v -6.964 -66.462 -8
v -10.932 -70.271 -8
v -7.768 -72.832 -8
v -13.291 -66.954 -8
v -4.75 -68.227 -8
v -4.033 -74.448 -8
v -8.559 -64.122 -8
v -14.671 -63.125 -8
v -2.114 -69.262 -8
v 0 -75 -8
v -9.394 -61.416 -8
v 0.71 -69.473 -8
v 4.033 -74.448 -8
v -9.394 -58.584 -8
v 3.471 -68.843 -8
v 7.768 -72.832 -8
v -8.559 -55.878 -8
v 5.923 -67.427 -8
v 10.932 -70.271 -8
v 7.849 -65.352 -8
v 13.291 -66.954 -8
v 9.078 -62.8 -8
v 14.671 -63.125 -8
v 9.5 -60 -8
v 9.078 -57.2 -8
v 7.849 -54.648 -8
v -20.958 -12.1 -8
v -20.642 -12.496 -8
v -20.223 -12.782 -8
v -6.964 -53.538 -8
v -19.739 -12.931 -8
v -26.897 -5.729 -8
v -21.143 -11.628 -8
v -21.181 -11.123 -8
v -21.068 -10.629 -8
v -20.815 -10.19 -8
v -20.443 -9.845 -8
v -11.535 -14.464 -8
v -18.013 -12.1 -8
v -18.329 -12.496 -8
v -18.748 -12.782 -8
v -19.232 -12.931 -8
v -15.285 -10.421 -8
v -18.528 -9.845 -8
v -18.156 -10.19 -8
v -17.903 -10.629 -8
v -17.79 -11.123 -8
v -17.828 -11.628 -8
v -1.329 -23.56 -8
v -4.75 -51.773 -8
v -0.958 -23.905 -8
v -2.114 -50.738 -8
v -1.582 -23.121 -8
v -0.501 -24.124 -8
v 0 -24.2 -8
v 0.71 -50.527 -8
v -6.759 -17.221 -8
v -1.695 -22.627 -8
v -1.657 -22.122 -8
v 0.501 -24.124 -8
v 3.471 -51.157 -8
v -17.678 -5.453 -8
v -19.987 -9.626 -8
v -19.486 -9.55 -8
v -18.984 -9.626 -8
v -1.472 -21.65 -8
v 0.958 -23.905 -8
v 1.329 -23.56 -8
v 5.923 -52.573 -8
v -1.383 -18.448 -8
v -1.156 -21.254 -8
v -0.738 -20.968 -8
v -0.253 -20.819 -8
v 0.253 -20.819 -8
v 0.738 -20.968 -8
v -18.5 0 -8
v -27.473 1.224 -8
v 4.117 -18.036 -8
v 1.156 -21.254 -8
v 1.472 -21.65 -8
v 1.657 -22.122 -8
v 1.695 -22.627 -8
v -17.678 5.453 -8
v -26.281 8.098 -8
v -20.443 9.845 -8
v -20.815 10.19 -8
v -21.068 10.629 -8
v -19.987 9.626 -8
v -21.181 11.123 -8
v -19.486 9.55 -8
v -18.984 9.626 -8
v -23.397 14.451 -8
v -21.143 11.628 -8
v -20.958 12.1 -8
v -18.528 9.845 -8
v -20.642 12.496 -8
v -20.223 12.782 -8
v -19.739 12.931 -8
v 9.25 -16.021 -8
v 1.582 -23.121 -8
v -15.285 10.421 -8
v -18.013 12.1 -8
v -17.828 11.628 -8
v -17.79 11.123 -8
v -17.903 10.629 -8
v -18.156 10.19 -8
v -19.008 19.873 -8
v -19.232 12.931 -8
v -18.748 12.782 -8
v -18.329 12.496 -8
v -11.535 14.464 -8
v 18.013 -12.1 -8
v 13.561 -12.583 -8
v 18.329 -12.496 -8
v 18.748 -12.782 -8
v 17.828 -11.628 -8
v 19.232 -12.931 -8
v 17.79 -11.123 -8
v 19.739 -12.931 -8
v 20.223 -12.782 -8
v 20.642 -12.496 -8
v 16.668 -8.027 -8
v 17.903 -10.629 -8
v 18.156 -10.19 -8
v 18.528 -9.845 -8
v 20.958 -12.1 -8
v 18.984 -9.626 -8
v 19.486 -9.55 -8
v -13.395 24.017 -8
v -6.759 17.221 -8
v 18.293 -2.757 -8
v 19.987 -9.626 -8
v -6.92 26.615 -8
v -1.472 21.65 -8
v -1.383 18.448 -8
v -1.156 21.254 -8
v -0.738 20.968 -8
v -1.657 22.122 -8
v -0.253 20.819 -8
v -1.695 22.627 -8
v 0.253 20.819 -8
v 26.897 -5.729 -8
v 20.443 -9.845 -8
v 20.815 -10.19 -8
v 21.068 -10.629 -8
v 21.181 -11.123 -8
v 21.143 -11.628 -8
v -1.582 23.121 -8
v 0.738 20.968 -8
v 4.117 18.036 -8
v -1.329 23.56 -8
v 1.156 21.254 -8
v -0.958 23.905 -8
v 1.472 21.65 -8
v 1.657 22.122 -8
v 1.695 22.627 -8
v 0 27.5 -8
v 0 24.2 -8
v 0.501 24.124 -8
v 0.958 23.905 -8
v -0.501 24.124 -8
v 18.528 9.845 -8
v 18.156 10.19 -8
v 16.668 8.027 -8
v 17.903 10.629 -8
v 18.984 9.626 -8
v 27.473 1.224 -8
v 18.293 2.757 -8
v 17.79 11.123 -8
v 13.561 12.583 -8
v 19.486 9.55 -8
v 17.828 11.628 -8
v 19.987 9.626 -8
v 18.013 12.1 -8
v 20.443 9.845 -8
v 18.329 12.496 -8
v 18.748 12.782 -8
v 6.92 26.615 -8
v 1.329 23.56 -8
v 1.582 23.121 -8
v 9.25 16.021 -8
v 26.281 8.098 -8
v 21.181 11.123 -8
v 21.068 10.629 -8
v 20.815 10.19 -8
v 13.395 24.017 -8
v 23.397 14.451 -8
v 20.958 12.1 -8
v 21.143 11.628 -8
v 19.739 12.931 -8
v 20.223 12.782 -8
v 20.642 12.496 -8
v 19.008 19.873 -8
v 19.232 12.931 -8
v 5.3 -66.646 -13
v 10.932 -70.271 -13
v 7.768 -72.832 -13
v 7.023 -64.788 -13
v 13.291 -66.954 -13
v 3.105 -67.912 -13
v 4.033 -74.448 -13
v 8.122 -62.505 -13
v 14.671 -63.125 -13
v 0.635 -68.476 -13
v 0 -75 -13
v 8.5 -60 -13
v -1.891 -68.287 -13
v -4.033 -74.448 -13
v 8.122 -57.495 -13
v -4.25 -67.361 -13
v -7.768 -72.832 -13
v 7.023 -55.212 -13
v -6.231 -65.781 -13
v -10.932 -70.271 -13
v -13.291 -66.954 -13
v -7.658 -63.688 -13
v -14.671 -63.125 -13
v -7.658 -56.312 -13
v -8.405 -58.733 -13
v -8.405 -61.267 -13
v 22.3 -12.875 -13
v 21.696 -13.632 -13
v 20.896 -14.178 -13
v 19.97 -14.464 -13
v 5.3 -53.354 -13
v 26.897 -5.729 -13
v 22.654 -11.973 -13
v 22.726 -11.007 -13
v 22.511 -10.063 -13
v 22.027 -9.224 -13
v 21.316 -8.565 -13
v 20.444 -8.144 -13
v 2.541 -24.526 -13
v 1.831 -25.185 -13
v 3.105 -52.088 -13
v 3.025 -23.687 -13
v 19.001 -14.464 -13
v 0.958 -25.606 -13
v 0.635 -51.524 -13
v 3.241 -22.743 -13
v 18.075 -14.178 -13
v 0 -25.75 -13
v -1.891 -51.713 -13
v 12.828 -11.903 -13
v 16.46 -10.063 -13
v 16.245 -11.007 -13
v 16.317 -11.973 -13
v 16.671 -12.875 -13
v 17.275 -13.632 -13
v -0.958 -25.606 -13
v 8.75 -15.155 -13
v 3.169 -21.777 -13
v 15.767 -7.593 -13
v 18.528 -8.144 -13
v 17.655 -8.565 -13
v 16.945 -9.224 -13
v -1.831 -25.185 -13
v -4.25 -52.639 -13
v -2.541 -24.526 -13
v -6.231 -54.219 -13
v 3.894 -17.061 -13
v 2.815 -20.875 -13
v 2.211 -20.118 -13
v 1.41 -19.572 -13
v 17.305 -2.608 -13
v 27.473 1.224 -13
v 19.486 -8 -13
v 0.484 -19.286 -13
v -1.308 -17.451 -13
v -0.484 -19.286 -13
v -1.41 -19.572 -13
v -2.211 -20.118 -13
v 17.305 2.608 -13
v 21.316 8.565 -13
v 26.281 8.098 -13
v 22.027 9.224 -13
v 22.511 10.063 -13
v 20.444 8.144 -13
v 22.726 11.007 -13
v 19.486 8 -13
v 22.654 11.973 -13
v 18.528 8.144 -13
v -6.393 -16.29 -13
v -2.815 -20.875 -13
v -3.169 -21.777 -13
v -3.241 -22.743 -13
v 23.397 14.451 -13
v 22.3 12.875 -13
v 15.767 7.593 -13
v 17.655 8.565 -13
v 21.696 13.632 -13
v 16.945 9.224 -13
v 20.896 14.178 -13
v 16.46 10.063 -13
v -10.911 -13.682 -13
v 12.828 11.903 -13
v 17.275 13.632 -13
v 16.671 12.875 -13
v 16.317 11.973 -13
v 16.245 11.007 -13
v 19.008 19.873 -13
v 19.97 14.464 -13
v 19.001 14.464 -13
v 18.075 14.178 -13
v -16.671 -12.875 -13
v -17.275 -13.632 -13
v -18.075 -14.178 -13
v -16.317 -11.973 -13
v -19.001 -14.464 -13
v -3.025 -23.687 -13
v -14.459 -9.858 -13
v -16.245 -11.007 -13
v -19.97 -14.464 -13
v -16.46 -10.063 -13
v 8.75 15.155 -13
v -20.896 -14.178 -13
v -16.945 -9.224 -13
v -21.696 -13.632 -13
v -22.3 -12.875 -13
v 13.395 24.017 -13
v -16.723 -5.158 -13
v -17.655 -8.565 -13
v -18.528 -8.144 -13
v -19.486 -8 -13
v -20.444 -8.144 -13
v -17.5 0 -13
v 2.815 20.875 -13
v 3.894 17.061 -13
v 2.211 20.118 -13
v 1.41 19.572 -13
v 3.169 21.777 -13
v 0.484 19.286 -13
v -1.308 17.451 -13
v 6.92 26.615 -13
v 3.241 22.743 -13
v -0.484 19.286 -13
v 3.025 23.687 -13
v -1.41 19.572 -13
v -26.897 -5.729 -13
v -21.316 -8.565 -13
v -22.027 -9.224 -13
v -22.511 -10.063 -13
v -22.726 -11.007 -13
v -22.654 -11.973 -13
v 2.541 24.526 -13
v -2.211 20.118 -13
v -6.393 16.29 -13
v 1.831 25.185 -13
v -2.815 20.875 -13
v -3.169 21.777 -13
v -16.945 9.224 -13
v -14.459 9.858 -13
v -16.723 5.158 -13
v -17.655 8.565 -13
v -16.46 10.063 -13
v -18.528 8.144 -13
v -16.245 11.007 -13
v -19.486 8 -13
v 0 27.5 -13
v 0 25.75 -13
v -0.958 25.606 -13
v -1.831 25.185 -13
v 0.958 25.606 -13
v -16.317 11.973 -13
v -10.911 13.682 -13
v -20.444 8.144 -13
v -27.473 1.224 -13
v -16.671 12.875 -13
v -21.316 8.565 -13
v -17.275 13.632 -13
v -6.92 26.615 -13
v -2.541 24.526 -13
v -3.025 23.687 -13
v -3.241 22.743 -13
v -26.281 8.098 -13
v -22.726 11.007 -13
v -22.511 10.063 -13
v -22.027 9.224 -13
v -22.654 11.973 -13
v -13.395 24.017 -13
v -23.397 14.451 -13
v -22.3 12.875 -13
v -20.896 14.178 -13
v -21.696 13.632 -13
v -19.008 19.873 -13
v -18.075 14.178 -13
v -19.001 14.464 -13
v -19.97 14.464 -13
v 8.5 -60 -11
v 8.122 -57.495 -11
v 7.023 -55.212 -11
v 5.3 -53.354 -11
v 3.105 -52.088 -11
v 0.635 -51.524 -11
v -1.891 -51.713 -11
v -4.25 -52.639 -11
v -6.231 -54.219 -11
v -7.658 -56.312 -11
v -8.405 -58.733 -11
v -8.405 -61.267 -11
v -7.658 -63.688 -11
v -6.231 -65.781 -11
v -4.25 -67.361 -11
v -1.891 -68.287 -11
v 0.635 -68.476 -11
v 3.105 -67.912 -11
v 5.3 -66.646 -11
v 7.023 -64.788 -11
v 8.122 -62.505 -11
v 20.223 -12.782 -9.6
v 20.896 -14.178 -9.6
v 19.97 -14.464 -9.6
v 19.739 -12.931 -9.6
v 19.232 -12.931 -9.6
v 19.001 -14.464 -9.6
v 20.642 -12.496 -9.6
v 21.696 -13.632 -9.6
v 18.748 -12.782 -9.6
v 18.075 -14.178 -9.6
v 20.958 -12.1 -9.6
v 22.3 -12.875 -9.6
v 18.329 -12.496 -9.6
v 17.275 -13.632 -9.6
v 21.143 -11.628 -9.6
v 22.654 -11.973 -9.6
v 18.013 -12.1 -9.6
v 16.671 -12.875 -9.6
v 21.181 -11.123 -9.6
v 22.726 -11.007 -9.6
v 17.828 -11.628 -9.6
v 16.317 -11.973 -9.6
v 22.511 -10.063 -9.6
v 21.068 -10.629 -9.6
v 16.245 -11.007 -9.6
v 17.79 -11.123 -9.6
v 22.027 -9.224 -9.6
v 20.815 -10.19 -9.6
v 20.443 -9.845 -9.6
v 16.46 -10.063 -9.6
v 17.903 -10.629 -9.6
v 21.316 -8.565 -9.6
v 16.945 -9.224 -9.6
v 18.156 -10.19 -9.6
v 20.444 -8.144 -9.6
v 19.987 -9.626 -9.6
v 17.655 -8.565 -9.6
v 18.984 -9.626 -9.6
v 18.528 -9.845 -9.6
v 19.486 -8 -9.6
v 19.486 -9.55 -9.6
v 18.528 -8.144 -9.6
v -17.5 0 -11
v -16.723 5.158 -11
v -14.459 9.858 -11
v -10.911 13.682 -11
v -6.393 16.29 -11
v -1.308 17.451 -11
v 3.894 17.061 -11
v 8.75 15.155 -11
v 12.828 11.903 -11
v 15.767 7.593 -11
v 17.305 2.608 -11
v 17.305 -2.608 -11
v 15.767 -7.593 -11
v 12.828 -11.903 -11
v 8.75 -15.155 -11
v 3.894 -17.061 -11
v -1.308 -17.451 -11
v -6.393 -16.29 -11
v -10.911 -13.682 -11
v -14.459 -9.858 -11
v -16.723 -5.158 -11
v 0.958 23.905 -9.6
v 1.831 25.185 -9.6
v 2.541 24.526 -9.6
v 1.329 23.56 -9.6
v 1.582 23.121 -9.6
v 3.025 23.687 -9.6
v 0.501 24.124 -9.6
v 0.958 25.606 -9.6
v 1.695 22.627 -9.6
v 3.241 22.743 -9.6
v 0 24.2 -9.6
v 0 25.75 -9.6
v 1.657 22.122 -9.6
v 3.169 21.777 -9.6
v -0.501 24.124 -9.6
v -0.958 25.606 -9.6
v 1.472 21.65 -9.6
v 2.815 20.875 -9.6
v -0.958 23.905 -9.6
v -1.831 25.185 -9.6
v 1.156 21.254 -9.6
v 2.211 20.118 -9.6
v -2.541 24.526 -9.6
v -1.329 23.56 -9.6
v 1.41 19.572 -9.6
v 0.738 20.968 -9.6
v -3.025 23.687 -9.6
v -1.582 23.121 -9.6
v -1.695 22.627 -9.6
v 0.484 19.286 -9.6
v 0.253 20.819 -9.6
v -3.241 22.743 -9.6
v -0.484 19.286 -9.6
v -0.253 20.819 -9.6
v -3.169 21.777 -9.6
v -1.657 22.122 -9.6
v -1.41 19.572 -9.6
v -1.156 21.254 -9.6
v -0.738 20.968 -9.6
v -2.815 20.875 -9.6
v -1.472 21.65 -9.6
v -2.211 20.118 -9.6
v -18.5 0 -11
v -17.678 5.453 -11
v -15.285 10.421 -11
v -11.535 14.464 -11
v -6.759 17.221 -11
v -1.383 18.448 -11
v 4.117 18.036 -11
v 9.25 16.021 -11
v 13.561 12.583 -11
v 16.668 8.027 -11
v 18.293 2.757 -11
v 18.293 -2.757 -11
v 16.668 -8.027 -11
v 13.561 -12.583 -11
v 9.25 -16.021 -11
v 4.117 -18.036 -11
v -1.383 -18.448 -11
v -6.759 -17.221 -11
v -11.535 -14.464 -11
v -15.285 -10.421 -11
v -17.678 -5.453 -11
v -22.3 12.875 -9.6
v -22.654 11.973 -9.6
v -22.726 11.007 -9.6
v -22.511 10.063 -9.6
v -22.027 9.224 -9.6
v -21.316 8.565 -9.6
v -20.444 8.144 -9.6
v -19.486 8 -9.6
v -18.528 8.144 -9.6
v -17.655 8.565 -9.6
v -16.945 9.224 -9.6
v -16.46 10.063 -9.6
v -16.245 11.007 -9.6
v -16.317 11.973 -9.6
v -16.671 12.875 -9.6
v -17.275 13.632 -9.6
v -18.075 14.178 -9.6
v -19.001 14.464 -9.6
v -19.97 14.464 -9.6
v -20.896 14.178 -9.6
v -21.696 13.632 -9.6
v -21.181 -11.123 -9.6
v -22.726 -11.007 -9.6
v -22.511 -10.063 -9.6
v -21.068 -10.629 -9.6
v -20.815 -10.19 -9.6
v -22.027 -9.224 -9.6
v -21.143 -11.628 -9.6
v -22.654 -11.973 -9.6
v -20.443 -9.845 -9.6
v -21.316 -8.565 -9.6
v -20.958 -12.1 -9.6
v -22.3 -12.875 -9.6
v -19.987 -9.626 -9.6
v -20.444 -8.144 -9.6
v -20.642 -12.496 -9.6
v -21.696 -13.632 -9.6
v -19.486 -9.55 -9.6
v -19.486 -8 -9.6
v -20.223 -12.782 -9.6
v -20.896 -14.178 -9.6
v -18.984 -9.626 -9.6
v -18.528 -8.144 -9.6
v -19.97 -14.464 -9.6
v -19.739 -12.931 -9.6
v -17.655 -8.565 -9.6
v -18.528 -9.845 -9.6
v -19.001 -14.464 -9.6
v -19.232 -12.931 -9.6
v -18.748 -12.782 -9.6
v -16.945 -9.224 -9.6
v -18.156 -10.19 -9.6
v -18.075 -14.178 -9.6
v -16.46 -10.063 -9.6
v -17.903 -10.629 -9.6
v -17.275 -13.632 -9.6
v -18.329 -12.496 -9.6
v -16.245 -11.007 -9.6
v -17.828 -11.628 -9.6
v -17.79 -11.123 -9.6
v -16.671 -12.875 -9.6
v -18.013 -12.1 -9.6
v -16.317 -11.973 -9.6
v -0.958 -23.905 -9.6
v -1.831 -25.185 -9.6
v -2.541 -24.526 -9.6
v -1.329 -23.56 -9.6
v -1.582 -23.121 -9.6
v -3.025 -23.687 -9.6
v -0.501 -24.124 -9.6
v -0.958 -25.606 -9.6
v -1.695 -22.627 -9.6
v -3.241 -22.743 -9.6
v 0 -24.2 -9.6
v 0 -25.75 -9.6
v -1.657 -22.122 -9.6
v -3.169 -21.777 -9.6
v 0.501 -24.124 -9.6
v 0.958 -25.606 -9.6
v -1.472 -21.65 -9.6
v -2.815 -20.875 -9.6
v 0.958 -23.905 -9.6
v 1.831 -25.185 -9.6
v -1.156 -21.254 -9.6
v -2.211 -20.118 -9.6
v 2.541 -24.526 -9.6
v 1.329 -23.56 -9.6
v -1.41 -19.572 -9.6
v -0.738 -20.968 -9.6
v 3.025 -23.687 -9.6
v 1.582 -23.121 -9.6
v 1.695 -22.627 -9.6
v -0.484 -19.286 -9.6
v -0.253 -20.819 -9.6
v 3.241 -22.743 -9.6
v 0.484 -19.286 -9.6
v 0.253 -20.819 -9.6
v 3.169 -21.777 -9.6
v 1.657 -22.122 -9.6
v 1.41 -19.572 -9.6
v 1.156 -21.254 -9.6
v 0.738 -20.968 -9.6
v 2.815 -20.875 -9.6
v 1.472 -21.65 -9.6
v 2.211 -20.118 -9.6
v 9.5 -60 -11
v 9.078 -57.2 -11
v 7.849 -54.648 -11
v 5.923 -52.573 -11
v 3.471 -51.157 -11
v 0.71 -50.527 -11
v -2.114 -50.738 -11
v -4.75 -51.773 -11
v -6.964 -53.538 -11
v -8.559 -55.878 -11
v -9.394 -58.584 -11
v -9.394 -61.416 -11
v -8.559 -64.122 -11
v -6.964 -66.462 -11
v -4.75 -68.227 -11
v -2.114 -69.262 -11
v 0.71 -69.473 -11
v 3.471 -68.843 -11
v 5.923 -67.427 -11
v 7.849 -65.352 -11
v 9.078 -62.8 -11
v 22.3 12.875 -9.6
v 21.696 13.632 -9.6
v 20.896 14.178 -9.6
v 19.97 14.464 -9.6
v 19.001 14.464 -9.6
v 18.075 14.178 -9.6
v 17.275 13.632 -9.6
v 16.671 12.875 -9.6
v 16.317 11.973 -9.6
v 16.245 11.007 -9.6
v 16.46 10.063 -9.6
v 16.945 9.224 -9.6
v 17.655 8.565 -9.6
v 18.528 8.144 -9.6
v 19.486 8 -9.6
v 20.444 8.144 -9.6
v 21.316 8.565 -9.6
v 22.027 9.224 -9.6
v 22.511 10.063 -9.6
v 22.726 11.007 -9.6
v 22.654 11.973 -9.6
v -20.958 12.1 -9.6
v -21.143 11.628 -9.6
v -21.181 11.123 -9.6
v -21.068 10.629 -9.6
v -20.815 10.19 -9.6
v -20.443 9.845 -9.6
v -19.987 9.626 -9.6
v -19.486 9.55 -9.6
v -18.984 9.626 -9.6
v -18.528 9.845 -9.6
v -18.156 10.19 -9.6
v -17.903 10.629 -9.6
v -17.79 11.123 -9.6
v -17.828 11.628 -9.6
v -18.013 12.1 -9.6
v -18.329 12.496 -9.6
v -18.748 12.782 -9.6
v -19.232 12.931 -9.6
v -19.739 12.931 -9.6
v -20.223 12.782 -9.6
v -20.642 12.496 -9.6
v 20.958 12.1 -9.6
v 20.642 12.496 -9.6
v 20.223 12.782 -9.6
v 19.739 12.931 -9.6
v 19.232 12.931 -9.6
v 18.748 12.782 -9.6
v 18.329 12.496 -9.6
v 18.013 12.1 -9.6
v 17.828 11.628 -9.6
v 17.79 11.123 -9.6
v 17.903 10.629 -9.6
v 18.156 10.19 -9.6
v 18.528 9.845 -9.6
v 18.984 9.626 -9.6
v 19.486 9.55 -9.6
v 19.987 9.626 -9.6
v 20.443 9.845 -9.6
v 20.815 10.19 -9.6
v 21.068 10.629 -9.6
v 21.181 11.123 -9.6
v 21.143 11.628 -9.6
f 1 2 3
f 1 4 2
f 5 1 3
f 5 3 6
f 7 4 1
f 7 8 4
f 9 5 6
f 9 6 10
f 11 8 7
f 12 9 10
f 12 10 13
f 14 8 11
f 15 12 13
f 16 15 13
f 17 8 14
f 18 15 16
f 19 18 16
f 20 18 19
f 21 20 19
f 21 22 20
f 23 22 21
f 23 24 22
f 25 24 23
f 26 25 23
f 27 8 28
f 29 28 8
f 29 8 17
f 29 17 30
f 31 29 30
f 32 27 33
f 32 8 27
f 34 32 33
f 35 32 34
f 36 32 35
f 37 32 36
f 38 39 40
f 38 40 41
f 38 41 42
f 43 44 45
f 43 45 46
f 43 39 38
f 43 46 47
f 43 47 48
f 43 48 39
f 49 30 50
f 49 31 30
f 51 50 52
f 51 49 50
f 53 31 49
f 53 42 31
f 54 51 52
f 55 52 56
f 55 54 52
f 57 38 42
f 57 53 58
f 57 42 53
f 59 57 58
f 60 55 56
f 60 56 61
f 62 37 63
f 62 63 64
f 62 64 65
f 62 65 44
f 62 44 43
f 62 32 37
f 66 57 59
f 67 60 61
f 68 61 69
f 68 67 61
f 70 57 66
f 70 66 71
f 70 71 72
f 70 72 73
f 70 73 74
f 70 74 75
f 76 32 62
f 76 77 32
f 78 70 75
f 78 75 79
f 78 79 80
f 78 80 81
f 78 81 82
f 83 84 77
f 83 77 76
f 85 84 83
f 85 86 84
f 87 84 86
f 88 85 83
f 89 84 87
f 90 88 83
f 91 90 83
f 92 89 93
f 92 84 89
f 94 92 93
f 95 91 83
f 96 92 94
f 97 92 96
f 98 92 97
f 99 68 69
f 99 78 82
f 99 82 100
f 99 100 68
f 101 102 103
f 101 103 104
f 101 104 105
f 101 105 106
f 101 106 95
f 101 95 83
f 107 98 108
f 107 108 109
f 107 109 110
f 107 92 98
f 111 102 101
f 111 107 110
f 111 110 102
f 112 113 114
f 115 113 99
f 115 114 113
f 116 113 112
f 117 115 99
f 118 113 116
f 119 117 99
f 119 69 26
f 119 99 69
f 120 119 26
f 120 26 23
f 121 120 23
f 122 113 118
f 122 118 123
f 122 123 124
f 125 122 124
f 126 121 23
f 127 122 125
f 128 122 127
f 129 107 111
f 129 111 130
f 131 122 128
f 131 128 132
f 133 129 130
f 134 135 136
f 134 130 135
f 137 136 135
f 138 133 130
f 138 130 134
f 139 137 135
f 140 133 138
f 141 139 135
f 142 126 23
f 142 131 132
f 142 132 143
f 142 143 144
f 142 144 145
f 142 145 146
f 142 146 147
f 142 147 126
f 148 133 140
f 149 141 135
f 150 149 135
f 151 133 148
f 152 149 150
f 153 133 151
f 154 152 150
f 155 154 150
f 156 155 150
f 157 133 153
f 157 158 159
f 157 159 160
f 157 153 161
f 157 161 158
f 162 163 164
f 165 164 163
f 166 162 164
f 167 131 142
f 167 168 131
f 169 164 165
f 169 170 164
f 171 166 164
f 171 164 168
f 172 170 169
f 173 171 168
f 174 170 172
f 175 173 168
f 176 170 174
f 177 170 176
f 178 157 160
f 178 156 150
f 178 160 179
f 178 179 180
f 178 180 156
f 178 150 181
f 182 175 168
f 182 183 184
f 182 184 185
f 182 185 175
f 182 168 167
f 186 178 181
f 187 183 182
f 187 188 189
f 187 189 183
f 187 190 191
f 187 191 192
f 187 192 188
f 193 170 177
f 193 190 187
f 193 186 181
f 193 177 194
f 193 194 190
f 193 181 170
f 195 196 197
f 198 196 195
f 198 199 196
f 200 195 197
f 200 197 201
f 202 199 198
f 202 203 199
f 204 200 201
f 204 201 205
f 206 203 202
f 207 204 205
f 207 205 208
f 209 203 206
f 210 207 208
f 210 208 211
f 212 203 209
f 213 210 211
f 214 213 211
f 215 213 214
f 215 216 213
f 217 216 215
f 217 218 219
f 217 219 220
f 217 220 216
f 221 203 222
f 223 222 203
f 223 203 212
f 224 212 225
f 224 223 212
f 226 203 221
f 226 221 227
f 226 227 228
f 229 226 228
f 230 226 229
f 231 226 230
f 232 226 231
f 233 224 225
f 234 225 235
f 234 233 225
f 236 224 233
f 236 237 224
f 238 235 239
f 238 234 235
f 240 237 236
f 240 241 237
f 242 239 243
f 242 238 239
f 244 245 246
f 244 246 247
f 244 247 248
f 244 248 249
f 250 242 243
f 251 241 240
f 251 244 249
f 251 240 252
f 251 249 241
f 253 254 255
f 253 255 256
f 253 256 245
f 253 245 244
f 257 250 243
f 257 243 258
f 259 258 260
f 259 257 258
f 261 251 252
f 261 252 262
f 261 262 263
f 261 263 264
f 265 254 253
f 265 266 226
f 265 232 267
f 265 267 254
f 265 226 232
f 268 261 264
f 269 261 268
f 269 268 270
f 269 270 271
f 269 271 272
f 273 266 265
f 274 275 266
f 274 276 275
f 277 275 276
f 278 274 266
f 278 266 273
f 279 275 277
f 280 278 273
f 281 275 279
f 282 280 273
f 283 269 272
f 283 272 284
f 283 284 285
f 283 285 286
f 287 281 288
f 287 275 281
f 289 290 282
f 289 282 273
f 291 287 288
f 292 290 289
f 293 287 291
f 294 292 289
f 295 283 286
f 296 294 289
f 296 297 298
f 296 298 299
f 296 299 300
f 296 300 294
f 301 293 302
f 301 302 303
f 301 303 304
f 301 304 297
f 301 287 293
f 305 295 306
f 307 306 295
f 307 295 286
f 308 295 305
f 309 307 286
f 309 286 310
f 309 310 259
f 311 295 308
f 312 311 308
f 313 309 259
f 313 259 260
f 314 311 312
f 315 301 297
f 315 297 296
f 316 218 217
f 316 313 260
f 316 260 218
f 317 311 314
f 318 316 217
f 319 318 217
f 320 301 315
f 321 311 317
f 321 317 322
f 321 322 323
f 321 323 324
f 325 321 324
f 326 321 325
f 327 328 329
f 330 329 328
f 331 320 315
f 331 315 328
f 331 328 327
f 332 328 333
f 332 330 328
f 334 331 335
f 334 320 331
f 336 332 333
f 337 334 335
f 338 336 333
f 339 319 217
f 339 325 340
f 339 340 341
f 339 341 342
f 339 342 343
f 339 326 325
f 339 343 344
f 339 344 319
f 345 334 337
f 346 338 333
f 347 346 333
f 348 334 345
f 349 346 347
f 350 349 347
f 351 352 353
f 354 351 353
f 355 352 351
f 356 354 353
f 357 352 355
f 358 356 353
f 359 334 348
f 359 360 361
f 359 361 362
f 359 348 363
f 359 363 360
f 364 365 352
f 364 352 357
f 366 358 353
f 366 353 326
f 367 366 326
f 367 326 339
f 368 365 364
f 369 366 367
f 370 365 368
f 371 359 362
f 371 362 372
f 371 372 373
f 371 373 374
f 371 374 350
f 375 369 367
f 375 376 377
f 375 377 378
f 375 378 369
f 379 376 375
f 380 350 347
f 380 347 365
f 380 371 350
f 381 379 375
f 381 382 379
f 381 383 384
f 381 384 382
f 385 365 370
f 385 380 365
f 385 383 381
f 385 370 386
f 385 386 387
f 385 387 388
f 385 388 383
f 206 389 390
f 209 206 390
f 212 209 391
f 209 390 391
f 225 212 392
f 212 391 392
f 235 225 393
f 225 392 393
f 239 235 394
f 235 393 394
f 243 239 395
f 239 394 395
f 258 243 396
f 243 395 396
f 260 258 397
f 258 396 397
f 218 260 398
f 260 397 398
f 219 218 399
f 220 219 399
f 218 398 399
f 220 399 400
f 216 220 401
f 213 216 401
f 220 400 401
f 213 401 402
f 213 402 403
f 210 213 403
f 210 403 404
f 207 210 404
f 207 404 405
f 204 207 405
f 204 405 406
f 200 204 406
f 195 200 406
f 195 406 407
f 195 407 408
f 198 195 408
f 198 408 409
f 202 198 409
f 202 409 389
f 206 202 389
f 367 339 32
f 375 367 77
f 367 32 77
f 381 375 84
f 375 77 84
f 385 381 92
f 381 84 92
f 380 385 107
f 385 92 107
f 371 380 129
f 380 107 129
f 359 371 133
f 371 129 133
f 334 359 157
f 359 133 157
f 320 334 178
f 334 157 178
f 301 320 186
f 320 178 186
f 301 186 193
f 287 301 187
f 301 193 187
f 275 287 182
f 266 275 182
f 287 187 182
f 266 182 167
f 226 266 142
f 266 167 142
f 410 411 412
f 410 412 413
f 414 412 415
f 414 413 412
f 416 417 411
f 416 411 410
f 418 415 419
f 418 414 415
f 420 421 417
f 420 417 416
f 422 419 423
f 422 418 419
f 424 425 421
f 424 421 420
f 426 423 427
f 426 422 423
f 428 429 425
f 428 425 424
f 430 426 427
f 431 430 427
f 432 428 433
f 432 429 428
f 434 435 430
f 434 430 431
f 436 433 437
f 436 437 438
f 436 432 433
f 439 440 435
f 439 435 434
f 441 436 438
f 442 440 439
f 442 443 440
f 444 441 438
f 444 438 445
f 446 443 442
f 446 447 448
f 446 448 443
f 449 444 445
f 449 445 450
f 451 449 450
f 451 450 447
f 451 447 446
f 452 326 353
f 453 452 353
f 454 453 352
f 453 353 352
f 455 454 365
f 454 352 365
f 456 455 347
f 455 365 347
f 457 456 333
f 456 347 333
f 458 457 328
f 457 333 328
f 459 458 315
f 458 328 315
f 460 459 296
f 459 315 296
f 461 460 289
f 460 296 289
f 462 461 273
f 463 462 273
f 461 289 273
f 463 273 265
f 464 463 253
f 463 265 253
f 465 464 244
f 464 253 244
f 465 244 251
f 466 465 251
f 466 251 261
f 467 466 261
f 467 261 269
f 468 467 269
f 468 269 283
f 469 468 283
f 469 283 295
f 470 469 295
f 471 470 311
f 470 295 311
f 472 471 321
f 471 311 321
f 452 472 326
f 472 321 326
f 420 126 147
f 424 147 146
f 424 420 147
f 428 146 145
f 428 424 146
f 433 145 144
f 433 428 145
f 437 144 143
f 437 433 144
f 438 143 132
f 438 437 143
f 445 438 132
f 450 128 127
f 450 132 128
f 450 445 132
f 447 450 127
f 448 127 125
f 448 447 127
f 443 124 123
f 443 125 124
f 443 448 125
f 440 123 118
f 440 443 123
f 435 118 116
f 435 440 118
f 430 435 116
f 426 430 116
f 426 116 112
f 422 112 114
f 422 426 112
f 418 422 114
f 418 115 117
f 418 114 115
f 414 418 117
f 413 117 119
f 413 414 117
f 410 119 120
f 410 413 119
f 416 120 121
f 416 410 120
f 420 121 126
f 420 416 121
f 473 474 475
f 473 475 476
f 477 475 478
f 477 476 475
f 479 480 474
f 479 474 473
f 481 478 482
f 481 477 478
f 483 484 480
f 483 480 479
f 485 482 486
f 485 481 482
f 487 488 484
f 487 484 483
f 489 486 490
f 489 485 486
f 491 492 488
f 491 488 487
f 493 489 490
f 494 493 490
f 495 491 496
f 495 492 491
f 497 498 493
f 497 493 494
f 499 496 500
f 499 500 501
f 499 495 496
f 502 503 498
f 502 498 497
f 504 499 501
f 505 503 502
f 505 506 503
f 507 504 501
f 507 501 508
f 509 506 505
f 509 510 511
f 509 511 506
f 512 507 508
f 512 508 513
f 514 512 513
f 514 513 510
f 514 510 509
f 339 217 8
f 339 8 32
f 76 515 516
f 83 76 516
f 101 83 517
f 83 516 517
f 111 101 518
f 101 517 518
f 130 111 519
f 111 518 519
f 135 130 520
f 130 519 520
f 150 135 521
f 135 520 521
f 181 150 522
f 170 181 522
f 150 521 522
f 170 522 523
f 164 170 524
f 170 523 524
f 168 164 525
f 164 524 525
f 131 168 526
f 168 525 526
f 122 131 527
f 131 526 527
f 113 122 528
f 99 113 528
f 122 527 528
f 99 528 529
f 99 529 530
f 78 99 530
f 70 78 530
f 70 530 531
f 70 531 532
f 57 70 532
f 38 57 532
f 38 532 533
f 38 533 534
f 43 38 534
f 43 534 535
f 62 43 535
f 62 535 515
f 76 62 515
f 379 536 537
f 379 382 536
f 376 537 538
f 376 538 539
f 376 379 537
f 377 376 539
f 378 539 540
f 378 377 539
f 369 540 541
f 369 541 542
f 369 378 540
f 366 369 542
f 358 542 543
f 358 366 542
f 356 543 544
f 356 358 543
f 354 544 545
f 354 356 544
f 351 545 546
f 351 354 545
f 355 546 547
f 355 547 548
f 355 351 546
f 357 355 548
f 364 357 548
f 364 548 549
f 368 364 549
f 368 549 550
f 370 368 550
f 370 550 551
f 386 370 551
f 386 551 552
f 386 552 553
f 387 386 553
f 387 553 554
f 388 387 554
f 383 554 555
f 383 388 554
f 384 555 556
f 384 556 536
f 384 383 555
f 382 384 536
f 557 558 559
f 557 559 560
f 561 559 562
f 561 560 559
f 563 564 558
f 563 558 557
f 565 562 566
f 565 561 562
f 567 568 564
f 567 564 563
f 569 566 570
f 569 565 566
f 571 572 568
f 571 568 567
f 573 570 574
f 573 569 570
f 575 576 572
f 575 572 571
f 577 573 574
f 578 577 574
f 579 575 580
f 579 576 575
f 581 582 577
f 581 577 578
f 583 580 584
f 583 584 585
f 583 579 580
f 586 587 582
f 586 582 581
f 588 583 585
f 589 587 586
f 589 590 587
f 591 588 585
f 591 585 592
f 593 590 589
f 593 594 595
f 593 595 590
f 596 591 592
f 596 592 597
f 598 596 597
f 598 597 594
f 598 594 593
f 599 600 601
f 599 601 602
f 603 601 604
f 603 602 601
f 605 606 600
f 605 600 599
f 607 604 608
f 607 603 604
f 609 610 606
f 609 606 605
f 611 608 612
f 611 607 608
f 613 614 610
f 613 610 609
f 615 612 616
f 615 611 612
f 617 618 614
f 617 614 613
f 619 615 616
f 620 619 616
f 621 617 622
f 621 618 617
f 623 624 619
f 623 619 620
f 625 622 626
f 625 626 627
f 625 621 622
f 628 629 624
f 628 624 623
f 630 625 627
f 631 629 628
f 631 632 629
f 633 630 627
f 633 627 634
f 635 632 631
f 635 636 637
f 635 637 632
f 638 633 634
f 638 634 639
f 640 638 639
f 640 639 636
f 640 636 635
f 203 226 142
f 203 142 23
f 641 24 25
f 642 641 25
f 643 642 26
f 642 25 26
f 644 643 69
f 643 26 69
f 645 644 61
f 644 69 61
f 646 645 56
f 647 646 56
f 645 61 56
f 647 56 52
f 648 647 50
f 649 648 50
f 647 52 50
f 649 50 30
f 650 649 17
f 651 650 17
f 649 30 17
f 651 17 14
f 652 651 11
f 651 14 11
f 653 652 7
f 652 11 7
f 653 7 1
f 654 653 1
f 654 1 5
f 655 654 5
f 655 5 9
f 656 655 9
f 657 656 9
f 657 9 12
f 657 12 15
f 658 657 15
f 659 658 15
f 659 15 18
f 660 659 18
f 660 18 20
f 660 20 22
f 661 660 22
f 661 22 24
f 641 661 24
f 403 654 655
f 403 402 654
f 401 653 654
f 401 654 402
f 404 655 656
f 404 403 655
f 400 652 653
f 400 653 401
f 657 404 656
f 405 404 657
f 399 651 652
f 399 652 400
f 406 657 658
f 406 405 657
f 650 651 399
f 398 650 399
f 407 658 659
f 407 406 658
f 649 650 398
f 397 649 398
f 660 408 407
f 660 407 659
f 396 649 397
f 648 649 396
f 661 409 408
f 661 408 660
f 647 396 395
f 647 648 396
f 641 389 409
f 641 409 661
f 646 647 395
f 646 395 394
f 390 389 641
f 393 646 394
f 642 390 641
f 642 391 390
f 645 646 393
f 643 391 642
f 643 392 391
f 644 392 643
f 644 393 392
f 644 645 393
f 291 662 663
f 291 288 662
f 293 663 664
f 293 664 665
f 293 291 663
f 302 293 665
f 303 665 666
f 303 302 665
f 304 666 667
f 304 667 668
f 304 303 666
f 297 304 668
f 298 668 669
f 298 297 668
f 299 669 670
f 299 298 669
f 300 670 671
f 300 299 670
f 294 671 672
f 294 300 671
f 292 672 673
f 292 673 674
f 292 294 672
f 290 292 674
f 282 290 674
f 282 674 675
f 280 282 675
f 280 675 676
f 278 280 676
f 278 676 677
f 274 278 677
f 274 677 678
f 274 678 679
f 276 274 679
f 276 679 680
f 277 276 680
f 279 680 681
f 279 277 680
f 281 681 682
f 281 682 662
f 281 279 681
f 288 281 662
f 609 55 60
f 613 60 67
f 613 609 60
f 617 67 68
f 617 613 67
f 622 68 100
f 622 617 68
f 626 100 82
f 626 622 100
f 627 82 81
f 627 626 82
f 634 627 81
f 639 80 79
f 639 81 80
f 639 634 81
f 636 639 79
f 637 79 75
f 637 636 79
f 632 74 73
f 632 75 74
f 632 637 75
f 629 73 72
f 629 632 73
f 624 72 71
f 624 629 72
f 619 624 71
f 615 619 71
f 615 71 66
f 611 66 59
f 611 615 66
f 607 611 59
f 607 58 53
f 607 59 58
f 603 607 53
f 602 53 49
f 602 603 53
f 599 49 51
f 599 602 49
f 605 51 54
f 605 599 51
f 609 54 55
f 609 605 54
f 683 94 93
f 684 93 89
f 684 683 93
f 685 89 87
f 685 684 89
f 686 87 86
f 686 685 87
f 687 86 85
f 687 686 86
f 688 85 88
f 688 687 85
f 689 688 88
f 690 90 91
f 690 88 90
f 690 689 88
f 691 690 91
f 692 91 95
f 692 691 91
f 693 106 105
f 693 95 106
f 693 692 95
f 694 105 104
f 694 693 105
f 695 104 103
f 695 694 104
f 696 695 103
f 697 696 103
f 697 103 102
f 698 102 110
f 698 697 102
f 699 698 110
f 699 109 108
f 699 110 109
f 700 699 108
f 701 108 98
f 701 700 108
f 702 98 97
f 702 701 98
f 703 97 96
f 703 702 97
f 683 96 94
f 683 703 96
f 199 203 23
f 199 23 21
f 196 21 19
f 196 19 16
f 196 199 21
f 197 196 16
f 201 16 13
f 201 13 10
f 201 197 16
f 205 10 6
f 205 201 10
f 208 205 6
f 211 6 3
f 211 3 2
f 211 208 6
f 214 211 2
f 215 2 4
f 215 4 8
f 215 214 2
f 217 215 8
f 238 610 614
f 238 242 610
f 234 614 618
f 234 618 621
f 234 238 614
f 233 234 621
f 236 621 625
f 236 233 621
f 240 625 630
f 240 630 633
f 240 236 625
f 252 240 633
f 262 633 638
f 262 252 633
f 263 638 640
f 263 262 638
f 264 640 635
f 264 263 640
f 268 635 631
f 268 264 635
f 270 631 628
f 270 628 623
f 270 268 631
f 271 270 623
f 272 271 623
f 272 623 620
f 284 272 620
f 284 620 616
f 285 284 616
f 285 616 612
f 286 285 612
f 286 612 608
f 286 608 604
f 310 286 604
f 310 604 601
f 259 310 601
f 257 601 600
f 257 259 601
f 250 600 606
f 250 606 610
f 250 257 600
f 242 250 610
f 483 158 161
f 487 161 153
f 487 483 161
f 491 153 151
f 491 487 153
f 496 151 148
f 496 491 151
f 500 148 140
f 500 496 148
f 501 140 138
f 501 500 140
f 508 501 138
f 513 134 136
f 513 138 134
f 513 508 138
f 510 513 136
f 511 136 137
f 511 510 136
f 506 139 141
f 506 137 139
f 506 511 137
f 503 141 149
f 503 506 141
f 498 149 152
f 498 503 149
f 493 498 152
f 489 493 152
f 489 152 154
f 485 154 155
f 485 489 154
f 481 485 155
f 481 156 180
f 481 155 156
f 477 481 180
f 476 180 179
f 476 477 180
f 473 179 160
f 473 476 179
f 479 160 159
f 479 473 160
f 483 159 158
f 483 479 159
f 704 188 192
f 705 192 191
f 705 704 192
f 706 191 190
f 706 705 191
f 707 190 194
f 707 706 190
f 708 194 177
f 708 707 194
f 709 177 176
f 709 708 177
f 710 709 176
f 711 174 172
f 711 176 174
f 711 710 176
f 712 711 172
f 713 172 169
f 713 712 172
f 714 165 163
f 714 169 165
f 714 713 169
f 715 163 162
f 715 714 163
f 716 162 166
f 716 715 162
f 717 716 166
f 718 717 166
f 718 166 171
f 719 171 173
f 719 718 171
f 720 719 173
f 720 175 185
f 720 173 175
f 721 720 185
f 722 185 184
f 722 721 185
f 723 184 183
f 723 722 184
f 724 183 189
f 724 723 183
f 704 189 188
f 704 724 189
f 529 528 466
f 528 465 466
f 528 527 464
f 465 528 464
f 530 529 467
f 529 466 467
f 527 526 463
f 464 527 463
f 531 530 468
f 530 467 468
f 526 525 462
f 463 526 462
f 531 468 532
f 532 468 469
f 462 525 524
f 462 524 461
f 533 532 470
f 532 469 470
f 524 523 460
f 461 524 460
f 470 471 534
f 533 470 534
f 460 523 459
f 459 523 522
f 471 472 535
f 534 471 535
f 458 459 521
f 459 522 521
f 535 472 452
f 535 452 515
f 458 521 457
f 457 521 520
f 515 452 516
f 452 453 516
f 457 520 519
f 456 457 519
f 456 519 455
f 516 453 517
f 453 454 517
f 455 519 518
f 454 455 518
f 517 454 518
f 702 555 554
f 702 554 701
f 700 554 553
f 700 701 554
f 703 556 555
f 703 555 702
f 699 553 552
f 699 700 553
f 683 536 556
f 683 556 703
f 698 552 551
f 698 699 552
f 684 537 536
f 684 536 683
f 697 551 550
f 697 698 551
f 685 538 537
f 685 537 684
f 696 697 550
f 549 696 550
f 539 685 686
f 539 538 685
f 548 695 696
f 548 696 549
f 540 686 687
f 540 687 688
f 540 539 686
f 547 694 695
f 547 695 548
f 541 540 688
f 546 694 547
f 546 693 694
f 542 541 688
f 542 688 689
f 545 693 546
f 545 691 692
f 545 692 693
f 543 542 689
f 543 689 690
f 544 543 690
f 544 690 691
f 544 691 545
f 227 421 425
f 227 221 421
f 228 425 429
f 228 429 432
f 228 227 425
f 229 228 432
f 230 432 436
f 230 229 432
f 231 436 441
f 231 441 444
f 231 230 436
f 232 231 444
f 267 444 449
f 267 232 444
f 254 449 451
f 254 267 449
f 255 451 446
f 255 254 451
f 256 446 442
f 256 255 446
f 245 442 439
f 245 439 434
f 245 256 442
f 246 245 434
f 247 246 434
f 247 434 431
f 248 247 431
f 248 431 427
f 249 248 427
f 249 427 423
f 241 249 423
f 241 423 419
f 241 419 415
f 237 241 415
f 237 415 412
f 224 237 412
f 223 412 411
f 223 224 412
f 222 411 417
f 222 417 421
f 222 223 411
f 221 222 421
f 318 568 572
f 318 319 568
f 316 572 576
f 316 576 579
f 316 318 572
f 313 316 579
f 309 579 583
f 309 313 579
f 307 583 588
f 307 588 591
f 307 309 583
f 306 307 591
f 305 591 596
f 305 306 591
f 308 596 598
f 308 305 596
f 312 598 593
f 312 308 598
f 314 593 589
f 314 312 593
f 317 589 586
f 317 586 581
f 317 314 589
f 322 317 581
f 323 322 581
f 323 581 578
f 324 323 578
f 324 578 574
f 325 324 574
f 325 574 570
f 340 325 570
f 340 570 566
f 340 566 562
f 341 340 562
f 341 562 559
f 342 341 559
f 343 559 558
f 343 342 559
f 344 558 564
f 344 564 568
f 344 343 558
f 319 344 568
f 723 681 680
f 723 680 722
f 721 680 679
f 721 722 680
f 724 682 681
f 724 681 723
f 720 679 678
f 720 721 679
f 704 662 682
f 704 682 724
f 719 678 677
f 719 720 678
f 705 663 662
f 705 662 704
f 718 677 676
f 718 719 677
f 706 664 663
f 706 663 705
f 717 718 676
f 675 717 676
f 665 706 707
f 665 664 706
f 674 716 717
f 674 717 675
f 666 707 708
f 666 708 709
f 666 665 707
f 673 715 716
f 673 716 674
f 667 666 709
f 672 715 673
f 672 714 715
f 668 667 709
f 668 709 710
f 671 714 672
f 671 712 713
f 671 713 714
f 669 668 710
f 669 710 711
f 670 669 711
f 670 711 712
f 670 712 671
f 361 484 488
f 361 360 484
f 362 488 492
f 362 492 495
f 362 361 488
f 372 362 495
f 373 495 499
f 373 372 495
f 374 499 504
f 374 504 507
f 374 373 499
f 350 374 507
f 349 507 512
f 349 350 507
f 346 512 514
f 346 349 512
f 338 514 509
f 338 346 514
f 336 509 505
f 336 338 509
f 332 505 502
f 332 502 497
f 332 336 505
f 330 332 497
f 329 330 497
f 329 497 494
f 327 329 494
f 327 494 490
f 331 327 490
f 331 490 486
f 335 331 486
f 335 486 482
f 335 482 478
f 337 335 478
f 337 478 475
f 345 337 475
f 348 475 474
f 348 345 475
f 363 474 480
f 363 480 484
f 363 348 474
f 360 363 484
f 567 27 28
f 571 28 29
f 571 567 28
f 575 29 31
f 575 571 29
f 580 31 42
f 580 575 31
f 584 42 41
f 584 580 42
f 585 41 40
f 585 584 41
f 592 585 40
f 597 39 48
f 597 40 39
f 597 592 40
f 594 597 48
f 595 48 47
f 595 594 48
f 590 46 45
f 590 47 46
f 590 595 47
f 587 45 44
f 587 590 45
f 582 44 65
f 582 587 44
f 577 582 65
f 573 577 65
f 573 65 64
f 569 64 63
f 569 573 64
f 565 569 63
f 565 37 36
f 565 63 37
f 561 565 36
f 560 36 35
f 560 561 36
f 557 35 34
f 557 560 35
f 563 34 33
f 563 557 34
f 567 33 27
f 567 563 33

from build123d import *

# Parameters (mm, degrees)
SKETCH_2_R                   = 27.5
EXTRUDE_2_DEPTH              = 2
SKETCH_22_R                  = 10
CUT_EXTRUDE_1_DEPTH          = 2
FILLET_4_R                   = 0.2
SKETCH_54_R                  = 27.5
EXTRUDE_6_DEPTH              = 11
SKETCH_55_R                  = 18.5
CUT_EXTRUDE_2_DEPTH          = 8
HOLE_WIZARD_M4_1_D           = 4.5
HOLE_WIZARD_M4_1_CBORE_D     = 8
HOLE_WIZARD_M4_1_CBORE_DEPTH = 1
PATTERN_CIRCULAR_1_COUNT     = 3
SKETCH_59_R                  = 18.5
SKETCH_59_R_2                = 17.5
EXTRUDE_7_DEPTH              = 1
EXTRUDE_8_DEPTH              = 9
FILLET_6_R                   = 0.3
SKETCH_68_R                  = 9.5
CUT_EXTRUDE_7_DEPTH          = 7
SKETCH_69_R                  = 8.5
CUT_EXTRUDE_8_DEPTH          = 3
SKETCH_80_W                  = 72.028937147
SKETCH_80_H                  = 17.189961631
CUT_EXTRUDE_9_DEPTH          = 176.5
SKETCH_83_R                  = 18.5
SKETCH_83_R_2                = 17.5
EXTRUDE_9_DEPTH              = 2
PATTERN_CIRCULAR_2_COUNT     = 6


with BuildPart() as part:
    # 스케치2 → 보스-돌출2 (new body)
    with BuildSketch(Plane(origin=(0, 6, 0), x_dir=(1, 0, 0), z_dir=(0, 0, -1))):
        with Locations((0, 6)):
            Circle(SKETCH_2_R)
    extrude(amount=EXTRUDE_2_DEPTH)

    # 스케치22 → 컷-돌출1 (cut)
    with BuildSketch(Plane.XY):
        Circle(SKETCH_22_R)
    extrude(amount=-CUT_EXTRUDE_1_DEPTH, mode=Mode.SUBTRACT)

    # 필렛4
    fillet_4_edges = [part.edges().sort_by_distance(p)[0] for p in [
        (-10, 0, 0),
    ]]
    fillet(fillet_4_edges, radius=FILLET_4_R)

    # 스케치54 → 보스-돌출6 (add)
    with BuildSketch(Plane(origin=(0, 0, -2), x_dir=(-1, 0, 0), z_dir=(0, 0, -1))):
        Circle(SKETCH_54_R)
    extrude(amount=EXTRUDE_6_DEPTH)

    # 스케치55 → 컷-돌출2 (cut)
    with BuildSketch(Plane(origin=(0, 0, -13), x_dir=(-1, 0, 0), z_dir=(0, 0, -1))):
        Circle(SKETCH_55_R)
    extrude(amount=-CUT_EXTRUDE_2_DEPTH, mode=Mode.SUBTRACT)

    # M4 육각 소켓 머리 캡 나사용 카운터보어1 (through all)
    with Locations(Plane(origin=(0, 0, -5), x_dir=(-1, 0, 0), z_dir=(0, 0, -1))):
        with Locations((0, 6)):
            hole_wizard_m4_1 = CounterBoreHole(HOLE_WIZARD_M4_1_D / 2, HOLE_WIZARD_M4_1_CBORE_D / 2, HOLE_WIZARD_M4_1_CBORE_DEPTH)

    # 원형 패턴1: M4 육각 소켓 머리 캡 나사용 카운터보어1 ×3 about axis
    pattern_circular_1_axis = Axis((0, 0, 0), (0, 0, 1))
    for i in range(1, PATTERN_CIRCULAR_1_COUNT):
        add(hole_wizard_m4_1.rotate(pattern_circular_1_axis, i * 360 / PATTERN_CIRCULAR_1_COUNT), mode=Mode.SUBTRACT)

    # 스케치59 → 보스-돌출7 (add)
    with BuildSketch(Plane(origin=(0, 0, -5), x_dir=(-1, 0, 0), z_dir=(0, 0, -1))):
        Circle(SKETCH_59_R)
        Circle(SKETCH_59_R_2, mode=Mode.SUBTRACT)
    extrude(amount=EXTRUDE_7_DEPTH)

    # 스케치60 → 보스-돌출8 (add)
    with BuildSketch(Plane(origin=(0, 0, -13), x_dir=(-1, 0, 0), z_dir=(0, 0, -1))):
        with BuildLine():
            Line((-26.896591779, -5.729166667), (-14.670868243, -63.125))
            ThreePointArc((-14.670868243, -63.125), (0, -75), (14.670868243, -63.125))
            Line((14.670868243, -63.125), (26.896591779, -5.729166667))
            ThreePointArc((26.896591779, -5.729166667), (0, -27.5), (-26.896591779, -5.729166667))
        make_face()
    extrude(amount=-EXTRUDE_8_DEPTH)

    # 필렛6
    fillet_6_edges = [part.edges().sort_by_distance(p)[0] for p in [
        (18.5, 0, -6),
    ]]
    fillet(fillet_6_edges, radius=FILLET_6_R)

    # 스케치68 → 컷-돌출7 (cut)
    with BuildSketch(Plane.XY.offset(-4)):
        with Locations((0, -60)):
            Circle(SKETCH_68_R)
    extrude(amount=-CUT_EXTRUDE_7_DEPTH, mode=Mode.SUBTRACT)

    # 스케치69 → 컷-돌출8 (cut, through all)
    with BuildSketch(Plane.XY.offset(-11)):
        with Locations((0, -60)):
            Circle(SKETCH_69_R)
    extrude(amount=-CUT_EXTRUDE_8_DEPTH, mode=Mode.SUBTRACT)

    # 스케치80 → 컷-돌출9 (cut, symmetric)
    with BuildSketch(Plane(origin=(0, 0, 0), x_dir=(1, 0, 0), z_dir=(0, 1, 0))):
        with Locations((0.446829634, -0.594980816)):
            Rectangle(SKETCH_80_W, SKETCH_80_H)
    extrude(amount=CUT_EXTRUDE_9_DEPTH, both=True, mode=Mode.SUBTRACT)

    # 스케치83 → 보스-돌출9 (add)
    with BuildSketch(Plane(origin=(0, 0, -13), x_dir=(-1, 0, 0), z_dir=(0, 0, -1))):
        Circle(SKETCH_83_R)
        Circle(SKETCH_83_R_2, mode=Mode.SUBTRACT)
    extrude(amount=-EXTRUDE_9_DEPTH)

    # 스케치89 → M3 육각 소켓 머리 캡 나사용 카운터보어1 (revolve, cut)
    with BuildSketch(Plane(origin=(0, 22.5, -13), x_dir=(0, 1, 0), z_dir=(1, 0, 0))):
        Polygon((0, 0), (0, 223.021463052), (1.7, 222), (1.7, 3.4), (3.25, 3.4), (3.25, 0), align=None)
    hole_wizard_m3_1 = revolve(axis=Axis((0, 22.5, -19.35), (0, 0, 1)), mode=Mode.SUBTRACT)

    # 원형 패턴2: M3 육각 소켓 머리 캡 나사용 카운터보어1 ×6 about axis
    pattern_circular_2_axis = Axis((0, 0, 0), (0, 0, 1))
    for i in range(1, PATTERN_CIRCULAR_2_COUNT):
        add(hole_wizard_m3_1.rotate(pattern_circular_2_axis, i * 360 / PATTERN_CIRCULAR_2_COUNT), mode=Mode.SUBTRACT)


solid = part.part
